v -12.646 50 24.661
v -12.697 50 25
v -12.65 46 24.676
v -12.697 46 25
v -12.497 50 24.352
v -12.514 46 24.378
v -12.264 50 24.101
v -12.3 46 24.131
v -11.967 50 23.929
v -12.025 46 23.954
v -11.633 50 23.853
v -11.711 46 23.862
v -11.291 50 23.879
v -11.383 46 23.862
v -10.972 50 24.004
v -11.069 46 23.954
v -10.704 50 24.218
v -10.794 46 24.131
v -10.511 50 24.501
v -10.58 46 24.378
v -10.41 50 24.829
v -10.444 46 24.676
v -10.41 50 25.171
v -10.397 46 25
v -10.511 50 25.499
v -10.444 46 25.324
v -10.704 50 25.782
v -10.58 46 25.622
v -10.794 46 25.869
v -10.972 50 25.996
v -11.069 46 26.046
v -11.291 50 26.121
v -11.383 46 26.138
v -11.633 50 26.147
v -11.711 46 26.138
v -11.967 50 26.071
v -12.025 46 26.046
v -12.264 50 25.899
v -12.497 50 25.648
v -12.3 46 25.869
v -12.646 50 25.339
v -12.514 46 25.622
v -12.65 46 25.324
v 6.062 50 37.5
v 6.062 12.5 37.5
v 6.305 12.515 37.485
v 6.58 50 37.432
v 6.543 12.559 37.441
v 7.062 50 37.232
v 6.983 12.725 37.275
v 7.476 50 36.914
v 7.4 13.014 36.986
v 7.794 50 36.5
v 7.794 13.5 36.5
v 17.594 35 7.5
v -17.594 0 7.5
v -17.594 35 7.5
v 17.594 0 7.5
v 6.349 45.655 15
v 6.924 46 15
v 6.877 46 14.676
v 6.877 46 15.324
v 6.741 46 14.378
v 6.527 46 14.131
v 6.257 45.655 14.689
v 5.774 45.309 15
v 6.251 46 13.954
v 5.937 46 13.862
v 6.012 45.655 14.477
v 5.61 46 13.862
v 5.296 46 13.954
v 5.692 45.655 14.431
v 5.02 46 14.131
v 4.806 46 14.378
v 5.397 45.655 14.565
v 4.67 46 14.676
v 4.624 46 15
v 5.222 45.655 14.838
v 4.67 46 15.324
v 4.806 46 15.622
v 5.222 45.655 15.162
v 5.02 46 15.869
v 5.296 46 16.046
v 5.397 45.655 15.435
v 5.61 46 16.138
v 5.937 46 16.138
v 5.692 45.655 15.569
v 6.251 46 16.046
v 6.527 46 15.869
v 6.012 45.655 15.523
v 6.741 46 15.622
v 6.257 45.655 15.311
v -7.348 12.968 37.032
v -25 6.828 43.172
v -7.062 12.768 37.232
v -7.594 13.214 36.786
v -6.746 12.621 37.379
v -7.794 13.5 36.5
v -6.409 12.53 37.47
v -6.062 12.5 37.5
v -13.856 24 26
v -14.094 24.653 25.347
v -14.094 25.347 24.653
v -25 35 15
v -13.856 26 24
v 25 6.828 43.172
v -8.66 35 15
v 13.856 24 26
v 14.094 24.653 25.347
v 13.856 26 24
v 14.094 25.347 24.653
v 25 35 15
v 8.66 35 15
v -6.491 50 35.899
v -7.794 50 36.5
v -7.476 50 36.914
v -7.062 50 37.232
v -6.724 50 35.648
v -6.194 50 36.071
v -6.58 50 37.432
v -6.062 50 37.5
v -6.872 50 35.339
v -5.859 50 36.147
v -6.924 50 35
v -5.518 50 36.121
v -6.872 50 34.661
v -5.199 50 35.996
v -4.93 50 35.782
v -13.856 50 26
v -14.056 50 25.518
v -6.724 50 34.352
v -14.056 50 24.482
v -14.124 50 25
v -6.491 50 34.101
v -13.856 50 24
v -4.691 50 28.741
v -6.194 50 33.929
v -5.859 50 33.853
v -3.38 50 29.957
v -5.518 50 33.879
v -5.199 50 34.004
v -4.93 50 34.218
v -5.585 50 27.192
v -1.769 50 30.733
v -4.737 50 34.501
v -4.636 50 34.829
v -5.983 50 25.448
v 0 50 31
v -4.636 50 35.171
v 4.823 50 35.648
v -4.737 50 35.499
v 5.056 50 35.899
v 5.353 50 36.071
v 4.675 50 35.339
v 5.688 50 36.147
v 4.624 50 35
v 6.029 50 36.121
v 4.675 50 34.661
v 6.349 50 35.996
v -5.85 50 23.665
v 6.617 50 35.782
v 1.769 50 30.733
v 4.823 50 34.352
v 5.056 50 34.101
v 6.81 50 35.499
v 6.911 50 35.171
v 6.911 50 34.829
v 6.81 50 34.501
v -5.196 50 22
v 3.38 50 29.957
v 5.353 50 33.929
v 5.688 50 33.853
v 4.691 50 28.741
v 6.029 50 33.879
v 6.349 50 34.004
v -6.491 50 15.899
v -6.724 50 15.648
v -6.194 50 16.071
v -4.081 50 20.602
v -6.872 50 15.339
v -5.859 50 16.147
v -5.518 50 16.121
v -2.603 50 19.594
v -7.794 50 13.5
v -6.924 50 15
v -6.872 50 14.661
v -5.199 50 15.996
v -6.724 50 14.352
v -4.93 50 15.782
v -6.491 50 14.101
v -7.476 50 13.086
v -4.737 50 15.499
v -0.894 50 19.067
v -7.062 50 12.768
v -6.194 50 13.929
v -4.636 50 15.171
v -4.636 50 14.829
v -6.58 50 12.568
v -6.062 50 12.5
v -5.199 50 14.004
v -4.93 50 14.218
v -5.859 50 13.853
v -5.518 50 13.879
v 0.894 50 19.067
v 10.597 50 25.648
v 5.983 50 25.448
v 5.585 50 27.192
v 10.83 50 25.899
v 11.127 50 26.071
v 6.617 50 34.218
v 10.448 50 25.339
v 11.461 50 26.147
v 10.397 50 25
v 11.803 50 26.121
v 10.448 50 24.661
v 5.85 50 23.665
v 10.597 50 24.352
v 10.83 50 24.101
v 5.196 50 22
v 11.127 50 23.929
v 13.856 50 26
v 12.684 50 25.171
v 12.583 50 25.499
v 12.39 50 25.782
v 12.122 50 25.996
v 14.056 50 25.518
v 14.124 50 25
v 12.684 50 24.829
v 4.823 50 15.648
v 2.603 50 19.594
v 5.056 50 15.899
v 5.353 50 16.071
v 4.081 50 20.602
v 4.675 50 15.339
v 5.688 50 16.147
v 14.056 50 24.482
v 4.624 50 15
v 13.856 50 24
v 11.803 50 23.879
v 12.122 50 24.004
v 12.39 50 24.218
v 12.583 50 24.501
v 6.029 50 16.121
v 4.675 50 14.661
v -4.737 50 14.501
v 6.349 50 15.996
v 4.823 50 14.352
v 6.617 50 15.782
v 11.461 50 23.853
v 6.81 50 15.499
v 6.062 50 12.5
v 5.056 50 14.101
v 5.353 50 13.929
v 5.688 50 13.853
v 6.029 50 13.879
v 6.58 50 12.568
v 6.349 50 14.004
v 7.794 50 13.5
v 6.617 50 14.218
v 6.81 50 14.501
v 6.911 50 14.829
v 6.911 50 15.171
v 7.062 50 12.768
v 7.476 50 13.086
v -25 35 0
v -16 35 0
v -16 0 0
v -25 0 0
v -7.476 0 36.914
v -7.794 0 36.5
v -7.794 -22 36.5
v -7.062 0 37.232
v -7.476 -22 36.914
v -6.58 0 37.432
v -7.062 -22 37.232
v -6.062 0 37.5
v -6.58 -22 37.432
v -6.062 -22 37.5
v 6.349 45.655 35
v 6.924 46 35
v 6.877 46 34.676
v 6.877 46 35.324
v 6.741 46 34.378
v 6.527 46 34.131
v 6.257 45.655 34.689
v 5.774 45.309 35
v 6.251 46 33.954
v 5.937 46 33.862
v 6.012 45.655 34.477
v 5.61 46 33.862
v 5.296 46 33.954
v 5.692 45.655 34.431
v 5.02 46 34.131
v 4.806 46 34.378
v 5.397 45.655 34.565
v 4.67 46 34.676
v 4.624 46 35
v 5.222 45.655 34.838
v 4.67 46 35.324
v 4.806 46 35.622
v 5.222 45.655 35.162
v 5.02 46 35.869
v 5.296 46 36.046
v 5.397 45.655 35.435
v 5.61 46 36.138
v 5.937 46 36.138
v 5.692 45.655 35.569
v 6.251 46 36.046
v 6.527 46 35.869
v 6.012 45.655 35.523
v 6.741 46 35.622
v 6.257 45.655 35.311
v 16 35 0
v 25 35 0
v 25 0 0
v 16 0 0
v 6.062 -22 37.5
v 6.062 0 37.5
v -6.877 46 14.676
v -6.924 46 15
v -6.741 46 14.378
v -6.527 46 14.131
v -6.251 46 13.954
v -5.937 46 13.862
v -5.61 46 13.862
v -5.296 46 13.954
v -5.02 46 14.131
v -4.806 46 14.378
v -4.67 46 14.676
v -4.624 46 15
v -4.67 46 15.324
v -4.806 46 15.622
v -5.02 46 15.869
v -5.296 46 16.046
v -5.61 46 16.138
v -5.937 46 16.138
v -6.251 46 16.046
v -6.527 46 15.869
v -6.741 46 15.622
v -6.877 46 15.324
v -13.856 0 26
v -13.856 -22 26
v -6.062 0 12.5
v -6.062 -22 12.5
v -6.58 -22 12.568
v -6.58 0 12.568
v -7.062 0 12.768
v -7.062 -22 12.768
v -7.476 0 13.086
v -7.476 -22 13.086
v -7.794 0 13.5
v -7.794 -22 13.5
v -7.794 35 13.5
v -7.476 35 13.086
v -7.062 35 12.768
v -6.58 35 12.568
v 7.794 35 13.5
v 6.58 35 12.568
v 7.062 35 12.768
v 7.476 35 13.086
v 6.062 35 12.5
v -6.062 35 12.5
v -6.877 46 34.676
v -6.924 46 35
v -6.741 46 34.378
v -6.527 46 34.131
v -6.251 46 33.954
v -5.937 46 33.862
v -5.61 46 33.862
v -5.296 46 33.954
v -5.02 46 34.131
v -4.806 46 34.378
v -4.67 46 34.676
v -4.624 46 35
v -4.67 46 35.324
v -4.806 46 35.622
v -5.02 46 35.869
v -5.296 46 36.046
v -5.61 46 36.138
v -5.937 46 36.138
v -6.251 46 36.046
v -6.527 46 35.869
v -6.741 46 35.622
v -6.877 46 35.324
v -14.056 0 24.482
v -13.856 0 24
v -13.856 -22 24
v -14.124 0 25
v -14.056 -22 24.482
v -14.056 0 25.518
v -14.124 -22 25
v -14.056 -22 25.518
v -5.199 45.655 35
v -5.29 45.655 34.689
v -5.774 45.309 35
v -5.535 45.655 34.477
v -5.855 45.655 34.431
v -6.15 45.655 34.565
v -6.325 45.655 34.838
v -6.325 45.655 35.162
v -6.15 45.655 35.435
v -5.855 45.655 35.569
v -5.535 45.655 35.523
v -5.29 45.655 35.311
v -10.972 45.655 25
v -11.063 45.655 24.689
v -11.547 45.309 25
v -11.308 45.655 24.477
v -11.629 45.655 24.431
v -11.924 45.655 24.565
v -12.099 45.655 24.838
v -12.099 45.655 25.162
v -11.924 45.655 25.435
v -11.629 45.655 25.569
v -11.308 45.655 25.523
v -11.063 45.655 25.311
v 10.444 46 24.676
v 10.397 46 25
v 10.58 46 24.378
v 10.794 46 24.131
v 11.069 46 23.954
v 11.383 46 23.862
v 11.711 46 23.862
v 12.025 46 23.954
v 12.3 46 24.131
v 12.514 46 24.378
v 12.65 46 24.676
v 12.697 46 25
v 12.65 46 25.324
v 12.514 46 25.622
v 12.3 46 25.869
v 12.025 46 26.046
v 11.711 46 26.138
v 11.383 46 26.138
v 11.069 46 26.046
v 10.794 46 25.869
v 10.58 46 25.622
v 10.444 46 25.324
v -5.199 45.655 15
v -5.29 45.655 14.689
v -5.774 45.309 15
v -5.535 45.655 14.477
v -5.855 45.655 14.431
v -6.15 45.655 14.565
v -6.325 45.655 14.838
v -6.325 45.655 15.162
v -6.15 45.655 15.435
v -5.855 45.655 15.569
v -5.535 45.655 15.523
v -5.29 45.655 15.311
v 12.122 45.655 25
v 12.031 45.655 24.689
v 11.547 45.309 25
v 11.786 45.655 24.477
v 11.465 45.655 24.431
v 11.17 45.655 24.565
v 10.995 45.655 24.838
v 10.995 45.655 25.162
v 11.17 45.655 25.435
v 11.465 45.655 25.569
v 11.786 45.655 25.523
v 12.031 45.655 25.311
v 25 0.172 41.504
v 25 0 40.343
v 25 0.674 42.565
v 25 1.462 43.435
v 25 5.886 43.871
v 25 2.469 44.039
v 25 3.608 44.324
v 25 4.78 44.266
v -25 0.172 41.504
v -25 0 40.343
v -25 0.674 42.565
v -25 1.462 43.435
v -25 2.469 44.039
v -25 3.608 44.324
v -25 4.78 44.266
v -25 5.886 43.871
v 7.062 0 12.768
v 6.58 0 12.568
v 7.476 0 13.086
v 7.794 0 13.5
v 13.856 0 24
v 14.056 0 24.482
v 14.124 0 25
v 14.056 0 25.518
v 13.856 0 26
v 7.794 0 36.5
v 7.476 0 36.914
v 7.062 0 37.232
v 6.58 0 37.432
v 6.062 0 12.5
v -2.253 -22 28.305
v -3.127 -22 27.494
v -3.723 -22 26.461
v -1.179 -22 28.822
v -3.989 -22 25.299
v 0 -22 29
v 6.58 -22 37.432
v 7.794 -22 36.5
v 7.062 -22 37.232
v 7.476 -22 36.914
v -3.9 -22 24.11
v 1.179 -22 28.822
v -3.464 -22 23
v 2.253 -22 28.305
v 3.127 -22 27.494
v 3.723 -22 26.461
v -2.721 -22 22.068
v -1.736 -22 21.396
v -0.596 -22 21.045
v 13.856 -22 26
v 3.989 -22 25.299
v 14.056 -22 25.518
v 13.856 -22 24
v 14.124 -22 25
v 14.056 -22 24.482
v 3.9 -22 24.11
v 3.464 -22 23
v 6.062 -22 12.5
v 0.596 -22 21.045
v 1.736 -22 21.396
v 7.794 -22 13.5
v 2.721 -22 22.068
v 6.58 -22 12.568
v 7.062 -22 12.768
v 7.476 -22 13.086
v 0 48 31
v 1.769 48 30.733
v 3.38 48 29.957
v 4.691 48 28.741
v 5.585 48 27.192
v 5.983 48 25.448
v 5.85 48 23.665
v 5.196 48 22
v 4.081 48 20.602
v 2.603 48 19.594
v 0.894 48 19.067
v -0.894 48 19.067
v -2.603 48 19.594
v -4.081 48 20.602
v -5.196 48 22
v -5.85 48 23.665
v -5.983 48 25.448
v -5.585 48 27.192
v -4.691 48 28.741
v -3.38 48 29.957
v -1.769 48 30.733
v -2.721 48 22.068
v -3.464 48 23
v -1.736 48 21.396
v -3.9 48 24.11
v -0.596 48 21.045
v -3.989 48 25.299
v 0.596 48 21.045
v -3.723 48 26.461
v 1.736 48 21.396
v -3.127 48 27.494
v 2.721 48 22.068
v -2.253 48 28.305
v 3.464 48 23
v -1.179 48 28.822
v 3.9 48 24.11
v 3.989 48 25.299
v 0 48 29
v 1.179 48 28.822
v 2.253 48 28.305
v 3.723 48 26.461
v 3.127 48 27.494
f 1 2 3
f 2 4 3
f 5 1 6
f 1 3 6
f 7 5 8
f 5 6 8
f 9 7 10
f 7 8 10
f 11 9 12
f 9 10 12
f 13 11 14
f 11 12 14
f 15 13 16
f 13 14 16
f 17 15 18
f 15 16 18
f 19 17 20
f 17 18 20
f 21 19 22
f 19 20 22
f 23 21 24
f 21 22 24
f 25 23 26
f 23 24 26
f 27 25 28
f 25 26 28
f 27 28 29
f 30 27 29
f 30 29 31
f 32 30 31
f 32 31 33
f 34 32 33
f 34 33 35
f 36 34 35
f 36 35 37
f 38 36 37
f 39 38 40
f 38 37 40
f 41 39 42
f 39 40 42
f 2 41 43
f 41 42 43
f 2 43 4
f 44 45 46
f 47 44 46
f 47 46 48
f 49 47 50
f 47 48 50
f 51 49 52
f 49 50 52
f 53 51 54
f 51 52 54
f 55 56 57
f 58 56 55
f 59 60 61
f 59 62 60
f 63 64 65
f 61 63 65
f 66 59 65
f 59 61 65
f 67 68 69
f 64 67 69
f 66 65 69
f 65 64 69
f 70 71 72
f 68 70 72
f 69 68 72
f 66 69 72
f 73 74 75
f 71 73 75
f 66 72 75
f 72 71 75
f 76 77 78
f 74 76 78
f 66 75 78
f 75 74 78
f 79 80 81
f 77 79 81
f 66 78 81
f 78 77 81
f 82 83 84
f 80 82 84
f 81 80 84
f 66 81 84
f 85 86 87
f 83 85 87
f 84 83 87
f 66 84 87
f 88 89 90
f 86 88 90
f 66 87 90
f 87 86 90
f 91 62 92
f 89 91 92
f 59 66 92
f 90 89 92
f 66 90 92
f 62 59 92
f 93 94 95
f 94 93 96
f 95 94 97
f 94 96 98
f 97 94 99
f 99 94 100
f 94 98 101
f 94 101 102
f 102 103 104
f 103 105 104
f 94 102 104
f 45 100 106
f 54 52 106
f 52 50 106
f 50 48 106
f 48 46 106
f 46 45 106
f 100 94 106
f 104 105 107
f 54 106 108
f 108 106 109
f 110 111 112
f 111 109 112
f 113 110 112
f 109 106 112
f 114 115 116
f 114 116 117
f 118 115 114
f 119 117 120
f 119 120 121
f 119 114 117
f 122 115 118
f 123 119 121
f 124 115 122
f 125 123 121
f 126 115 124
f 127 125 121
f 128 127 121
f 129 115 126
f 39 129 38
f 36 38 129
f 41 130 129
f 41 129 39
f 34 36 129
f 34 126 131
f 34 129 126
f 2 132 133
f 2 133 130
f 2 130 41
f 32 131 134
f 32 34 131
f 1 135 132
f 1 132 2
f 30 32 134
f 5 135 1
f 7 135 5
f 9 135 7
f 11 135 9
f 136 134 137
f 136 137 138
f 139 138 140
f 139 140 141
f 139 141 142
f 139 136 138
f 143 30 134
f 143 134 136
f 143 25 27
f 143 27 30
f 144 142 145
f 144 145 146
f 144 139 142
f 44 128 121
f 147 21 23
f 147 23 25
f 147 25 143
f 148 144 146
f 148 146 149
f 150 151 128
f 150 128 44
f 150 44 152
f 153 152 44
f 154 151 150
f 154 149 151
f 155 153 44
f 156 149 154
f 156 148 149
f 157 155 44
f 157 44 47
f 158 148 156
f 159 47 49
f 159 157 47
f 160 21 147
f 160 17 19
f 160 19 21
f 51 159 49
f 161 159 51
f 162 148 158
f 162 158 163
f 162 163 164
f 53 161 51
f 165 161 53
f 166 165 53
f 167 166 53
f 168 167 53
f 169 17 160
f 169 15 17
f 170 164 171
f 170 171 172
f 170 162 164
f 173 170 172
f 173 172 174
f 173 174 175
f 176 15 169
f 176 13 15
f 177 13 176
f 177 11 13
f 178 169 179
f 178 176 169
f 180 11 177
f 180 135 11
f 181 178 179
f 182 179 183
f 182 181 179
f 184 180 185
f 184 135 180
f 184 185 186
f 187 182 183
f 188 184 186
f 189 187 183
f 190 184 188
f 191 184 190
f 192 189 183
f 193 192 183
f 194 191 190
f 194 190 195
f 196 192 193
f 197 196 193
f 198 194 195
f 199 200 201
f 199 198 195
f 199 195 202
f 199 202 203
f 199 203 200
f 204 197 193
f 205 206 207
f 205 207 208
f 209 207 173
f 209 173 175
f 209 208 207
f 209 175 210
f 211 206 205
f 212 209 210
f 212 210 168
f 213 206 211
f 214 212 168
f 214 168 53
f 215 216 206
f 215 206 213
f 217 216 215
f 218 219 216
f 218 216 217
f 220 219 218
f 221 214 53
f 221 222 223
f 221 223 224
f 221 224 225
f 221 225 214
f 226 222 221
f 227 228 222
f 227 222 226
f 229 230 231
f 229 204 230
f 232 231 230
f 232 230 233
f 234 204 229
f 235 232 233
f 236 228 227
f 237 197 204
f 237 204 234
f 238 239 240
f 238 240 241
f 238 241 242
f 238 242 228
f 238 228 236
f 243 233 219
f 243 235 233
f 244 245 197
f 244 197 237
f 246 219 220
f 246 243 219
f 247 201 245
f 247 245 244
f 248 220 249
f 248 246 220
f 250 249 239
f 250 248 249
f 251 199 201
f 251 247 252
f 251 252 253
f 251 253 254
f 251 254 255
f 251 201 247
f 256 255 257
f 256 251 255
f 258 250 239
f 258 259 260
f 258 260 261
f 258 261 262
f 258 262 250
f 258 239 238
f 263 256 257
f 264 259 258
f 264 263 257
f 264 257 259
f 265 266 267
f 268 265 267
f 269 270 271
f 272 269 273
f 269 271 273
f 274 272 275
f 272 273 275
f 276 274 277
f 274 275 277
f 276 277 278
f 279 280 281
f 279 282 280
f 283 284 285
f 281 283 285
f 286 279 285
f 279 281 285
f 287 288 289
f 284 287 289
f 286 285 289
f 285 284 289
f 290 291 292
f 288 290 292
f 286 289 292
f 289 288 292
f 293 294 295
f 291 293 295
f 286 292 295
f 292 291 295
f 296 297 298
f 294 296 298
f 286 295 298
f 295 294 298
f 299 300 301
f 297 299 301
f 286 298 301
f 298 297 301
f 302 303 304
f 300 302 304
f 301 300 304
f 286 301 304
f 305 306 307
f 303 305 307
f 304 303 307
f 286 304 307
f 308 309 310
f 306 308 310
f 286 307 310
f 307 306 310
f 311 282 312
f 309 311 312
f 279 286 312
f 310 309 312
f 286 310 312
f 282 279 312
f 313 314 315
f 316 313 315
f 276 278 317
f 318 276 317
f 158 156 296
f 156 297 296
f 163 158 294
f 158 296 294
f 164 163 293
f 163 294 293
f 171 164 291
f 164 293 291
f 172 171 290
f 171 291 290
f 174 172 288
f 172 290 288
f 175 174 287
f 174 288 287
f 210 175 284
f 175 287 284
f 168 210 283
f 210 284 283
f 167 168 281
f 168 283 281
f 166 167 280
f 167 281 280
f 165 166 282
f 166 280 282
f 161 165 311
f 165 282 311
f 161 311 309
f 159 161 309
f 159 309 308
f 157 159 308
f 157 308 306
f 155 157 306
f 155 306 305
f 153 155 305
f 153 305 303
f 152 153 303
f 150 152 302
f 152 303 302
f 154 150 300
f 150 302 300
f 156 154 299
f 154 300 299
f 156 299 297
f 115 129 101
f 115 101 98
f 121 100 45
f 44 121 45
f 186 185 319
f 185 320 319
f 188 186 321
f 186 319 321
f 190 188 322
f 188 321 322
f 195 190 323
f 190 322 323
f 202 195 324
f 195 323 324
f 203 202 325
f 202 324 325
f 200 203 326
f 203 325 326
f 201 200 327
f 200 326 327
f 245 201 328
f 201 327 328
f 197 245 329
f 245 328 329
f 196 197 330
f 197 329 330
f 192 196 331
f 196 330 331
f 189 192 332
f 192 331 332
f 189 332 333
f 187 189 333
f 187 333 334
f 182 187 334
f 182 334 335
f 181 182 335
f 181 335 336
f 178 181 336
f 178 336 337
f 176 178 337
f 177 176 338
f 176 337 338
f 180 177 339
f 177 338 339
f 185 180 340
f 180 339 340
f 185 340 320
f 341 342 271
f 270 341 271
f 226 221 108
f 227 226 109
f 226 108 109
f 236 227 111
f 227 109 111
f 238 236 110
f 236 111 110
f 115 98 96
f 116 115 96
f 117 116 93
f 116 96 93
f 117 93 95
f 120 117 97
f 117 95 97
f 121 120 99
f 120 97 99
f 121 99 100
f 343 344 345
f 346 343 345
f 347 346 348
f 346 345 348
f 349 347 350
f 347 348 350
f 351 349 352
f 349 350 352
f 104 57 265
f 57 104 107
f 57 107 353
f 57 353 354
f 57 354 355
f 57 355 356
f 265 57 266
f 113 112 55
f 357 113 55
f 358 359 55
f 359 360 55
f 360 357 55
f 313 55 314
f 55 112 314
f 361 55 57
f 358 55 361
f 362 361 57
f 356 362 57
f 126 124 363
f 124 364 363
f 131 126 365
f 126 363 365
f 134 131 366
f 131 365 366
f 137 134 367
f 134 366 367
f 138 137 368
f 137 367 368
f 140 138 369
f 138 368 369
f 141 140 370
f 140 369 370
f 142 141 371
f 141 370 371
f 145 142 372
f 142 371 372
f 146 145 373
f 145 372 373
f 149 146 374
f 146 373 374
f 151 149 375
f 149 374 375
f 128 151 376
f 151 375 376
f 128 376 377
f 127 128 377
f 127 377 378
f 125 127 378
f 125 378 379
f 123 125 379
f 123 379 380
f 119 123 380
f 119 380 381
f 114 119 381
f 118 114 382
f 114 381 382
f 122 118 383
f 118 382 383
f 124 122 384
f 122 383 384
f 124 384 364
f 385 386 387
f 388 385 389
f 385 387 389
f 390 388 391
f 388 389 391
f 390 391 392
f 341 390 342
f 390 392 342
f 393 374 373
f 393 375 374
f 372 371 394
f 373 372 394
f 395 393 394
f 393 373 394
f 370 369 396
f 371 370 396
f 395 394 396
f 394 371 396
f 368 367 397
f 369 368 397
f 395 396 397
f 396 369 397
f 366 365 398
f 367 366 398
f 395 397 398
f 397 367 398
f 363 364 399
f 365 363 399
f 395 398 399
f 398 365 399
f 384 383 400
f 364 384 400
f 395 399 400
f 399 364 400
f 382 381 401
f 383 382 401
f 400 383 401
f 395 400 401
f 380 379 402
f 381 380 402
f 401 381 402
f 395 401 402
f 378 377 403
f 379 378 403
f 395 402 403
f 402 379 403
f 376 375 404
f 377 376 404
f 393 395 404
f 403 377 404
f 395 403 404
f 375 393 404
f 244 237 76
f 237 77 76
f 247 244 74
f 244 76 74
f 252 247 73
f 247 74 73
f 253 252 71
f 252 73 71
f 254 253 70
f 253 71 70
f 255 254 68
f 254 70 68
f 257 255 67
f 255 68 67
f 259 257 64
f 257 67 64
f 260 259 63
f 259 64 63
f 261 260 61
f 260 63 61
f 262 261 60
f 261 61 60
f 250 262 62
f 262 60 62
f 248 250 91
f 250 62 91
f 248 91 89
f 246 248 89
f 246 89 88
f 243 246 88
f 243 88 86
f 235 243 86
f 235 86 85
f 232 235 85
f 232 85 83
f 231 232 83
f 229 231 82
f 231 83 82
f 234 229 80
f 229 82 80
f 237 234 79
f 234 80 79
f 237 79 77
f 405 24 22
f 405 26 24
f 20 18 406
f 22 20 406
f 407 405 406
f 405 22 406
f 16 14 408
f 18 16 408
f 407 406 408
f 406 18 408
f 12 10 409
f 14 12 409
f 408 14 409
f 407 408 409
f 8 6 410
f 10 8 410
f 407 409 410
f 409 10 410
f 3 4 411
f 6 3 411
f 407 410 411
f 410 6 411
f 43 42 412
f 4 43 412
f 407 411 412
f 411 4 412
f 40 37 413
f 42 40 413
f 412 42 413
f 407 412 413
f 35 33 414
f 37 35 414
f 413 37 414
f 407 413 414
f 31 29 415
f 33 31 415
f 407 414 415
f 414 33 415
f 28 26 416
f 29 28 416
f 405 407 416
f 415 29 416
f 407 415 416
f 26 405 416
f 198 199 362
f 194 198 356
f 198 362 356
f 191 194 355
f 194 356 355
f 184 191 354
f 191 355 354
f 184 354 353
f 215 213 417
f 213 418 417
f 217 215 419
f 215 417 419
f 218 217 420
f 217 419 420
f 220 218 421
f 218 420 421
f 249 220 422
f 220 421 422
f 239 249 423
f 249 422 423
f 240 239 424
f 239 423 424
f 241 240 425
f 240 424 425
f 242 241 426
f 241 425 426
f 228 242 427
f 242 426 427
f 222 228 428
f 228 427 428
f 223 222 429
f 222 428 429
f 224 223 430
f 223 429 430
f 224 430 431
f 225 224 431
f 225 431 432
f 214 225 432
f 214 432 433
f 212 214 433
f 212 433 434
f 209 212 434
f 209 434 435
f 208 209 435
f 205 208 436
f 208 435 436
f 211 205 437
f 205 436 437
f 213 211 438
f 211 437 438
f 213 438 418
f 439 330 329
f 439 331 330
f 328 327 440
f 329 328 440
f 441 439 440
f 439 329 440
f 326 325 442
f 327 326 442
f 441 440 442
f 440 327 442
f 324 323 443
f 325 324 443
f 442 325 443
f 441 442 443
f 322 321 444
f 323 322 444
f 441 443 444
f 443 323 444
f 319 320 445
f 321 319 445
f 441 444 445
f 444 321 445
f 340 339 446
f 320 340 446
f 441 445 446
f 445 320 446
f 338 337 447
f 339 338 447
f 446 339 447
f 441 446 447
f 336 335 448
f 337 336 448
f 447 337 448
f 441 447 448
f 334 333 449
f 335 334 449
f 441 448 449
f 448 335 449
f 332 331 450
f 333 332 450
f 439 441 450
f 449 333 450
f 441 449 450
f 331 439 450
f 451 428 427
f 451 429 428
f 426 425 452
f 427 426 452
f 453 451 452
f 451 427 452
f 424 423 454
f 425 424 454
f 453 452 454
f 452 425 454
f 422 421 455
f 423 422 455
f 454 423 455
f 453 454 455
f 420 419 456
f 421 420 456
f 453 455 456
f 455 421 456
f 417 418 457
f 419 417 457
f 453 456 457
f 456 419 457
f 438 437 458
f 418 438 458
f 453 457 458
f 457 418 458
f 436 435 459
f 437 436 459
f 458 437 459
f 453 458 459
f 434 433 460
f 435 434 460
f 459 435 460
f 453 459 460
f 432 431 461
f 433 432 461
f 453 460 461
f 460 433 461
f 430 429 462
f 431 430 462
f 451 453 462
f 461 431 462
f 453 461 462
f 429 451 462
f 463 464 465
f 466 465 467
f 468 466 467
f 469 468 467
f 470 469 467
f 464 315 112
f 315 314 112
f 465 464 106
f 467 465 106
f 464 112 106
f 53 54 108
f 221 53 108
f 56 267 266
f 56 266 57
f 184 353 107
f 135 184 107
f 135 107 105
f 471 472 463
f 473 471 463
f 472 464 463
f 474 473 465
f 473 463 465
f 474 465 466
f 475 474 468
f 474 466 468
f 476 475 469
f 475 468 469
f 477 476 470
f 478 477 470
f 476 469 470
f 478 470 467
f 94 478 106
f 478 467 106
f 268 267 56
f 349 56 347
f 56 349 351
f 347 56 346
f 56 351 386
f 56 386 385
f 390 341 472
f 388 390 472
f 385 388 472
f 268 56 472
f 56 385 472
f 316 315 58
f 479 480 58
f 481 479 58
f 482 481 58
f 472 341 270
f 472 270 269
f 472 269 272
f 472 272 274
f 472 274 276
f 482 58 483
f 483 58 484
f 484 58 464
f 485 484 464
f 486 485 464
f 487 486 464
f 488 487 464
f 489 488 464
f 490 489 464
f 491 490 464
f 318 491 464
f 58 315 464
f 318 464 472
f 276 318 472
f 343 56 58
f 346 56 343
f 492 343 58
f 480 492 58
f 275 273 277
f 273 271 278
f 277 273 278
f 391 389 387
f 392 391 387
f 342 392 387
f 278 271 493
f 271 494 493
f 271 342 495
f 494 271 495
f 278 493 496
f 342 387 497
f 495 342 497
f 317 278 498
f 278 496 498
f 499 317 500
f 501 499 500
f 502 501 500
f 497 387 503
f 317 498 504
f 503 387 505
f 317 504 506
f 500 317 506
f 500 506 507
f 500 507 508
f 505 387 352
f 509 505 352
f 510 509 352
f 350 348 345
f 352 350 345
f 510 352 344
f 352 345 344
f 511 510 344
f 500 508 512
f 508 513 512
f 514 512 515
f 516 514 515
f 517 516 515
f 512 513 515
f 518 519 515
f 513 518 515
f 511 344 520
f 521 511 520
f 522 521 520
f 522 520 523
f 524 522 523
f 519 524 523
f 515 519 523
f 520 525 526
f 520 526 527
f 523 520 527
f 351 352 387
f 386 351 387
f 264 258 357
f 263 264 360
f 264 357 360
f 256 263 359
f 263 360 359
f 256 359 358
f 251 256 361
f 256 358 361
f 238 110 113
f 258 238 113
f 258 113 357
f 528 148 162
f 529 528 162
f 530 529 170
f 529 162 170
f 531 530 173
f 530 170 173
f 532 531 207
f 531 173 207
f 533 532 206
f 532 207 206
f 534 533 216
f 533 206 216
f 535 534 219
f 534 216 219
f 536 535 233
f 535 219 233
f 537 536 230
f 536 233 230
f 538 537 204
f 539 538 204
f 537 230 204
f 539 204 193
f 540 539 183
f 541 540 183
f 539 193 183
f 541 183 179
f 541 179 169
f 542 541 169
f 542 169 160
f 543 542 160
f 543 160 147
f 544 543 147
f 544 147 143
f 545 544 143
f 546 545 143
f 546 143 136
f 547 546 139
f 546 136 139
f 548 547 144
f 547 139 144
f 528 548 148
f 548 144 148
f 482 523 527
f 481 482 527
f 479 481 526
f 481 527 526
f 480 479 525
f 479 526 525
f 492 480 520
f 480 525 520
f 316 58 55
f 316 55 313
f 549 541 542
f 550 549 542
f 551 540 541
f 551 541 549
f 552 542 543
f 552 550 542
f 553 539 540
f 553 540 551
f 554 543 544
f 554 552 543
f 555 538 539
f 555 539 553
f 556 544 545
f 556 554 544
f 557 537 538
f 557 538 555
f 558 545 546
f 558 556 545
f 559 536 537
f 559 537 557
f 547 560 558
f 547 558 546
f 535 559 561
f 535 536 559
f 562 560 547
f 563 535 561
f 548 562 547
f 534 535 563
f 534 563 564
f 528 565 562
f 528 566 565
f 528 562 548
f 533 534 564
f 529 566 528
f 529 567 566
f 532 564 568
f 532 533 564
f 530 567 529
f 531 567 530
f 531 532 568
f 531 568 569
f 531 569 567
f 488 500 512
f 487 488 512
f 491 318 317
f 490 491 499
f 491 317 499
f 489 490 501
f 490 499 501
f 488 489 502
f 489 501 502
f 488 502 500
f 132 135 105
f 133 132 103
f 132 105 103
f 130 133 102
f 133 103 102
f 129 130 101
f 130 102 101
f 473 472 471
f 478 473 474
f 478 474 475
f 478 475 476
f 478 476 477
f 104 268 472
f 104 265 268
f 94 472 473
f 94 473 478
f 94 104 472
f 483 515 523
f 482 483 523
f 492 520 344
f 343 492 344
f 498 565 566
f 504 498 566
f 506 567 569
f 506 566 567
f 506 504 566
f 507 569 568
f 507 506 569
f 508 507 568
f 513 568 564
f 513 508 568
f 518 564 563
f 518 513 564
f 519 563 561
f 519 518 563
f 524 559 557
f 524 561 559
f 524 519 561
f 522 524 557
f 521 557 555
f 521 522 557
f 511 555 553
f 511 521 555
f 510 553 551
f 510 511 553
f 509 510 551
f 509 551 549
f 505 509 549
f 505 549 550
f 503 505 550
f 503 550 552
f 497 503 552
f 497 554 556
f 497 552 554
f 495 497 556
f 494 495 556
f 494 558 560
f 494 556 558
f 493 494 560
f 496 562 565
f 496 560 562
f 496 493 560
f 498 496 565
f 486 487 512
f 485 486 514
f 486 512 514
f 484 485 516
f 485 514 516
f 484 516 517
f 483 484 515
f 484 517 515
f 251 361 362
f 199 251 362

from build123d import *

# Parameters (mm, degrees)
BOSS_EXTRUDE1_DEPTH            = 25
BOSS_EXTRUDE2_DEPTH            = 50
BOSS_EXTRUDE2_DEPTH_BACK       = 22
CUT_EXTRUDE1_DEPTH             = 89.177744216
CUT_EXTRUDE1_DEPTH_BACK        = 89.177744216
SKETCH3_R                      = 4
SKETCH4_R                      = 6
CUT_EXTRUDE2_DEPTH             = 2
CUT_EXTRUDE3_DEPTH             = 77.421950872
CUT_EXTRUDE3_DEPTH_BACK        = 77.421950872
F_2_3_2_3_DIAMETER_HOLE1_D     = 2.3
F_2_3_2_3_DIAMETER_HOLE1_DEPTH = 4
F_2_3_2_3_DIAMETER_HOLE1_TIP   = 0.690989712


with BuildPart() as part:
    # Sketch1 → Boss-Extrude1 (new, symmetric)
    with BuildSketch(Plane(origin=(0, 0, 0), x_dir=(0, 0, -1), z_dir=(1, 0, 0))):
        with BuildLine():
            Line((0, 0), (-40.343145751, 0))
            ThreePointArc((-40.343145751, 0), (-44.038663881, 2.469266271), (-43.171572875, 6.828427125))
            Line((-43.171572875, 6.828427125), (-15, 35))
            Line((-15, 35), (0, 35))
            Line((0, 35), (0, 0))
        make_face()
    extrude(amount=BOSS_EXTRUDE1_DEPTH, both=True)

    # Sketch2 → Boss-Extrude2 (add, two sides: drawn at the far end of the back side and taken through both)
    with BuildSketch(Plane(origin=(0, 0, 0), x_dir=(1, 0, 0), z_dir=(0, 1, 0)).offset(-BOSS_EXTRUDE2_DEPTH_BACK)):
        with BuildLine():
            Line((-7.794228634, -13.5), (-13.856406461, -24))
            ThreePointArc((-13.856406461, -24), (-14.124355653, -25), (-13.856406461, -26))
            Line((-13.856406461, -26), (-7.794228634, -36.5))
            ThreePointArc((-7.794228634, -36.5), (-7.062177826, -37.232050808), (-6.062177826, -37.5))
            Line((-6.062177826, -37.5), (6.062177826, -37.5))
            ThreePointArc((6.062177826, -37.5), (7.062177826, -37.232050808), (7.794228634, -36.5))
            Line((7.794228634, -36.5), (13.856406461, -26))
            ThreePointArc((13.856406461, -26), (14.124355653, -25), (13.856406461, -24))
            Line((13.856406461, -24), (7.794228634, -13.5))
            ThreePointArc((7.794228634, -13.5), (7.062177826, -12.767949192), (6.062177826, -12.5))
            Line((6.062177826, -12.5), (-6.062177826, -12.5))
            ThreePointArc((-6.062177826, -12.5), (-7.062177826, -12.767949192), (-7.794228634, -13.5))
        make_face()
    extrude(amount=BOSS_EXTRUDE2_DEPTH + BOSS_EXTRUDE2_DEPTH_BACK)

    # Sketch3 → Cut-Extrude1 (cut, two sides: drawn at the far end of the back side and taken through both)
    with BuildSketch(Plane(origin=(0, 50, 0), x_dir=(1, 0, 0), z_dir=(0, 1, 0)).offset(-CUT_EXTRUDE1_DEPTH_BACK)):
        with Locations(Location((0, -25, 0), (0, 0, 270))):
            Circle(SKETCH3_R)
    extrude(amount=CUT_EXTRUDE1_DEPTH + CUT_EXTRUDE1_DEPTH_BACK, mode=Mode.SUBTRACT)

    # Sketch4 → Cut-Extrude2 (cut)
    with BuildSketch(Plane(origin=(0, 50, 0), x_dir=(1, 0, 0), z_dir=(0, 1, 0))):
        with Locations(Location((0, -25, 0), (0, 0, 270))):
            Circle(SKETCH4_R)
    extrude(amount=-CUT_EXTRUDE2_DEPTH, mode=Mode.SUBTRACT)

    # Sketch5 → Cut-Extrude3 (cut, two sides: drawn at the far end of the back side and taken through both)
    with BuildSketch(Plane(origin=(0, 35, 0), x_dir=(1, 0, 0), z_dir=(0, 1, 0)).offset(-CUT_EXTRUDE3_DEPTH_BACK)):
        Polygon((-17.594174213, -7.5), (17.594174213, -7.5), (16, 0), (-16, 0), align=None)
    extrude(amount=CUT_EXTRUDE3_DEPTH + CUT_EXTRUDE3_DEPTH_BACK, mode=Mode.SUBTRACT)

    # Ø2.3 (2.3) Diameter Hole1
    with Locations(Plane(origin=(0, 50, 0), x_dir=(1, 0, 0), z_dir=(0, 1, 0))):
        with Locations((-11.547005384, -25), (-5.773502692, -15), (5.773502692, -15), (11.547005384, -25), (5.773502692, -35), (-5.773502692, -35)):
            Hole(F_2_3_2_3_DIAMETER_HOLE1_D / 2, depth=F_2_3_2_3_DIAMETER_HOLE1_DEPTH)
            with Locations((0, 0, -(F_2_3_2_3_DIAMETER_HOLE1_DEPTH + F_2_3_2_3_DIAMETER_HOLE1_TIP / 2))):  # 118° drill point
                Cone(0, F_2_3_2_3_DIAMETER_HOLE1_D / 2, F_2_3_2_3_DIAMETER_HOLE1_TIP, mode=Mode.SUBTRACT)


solid = part.part
